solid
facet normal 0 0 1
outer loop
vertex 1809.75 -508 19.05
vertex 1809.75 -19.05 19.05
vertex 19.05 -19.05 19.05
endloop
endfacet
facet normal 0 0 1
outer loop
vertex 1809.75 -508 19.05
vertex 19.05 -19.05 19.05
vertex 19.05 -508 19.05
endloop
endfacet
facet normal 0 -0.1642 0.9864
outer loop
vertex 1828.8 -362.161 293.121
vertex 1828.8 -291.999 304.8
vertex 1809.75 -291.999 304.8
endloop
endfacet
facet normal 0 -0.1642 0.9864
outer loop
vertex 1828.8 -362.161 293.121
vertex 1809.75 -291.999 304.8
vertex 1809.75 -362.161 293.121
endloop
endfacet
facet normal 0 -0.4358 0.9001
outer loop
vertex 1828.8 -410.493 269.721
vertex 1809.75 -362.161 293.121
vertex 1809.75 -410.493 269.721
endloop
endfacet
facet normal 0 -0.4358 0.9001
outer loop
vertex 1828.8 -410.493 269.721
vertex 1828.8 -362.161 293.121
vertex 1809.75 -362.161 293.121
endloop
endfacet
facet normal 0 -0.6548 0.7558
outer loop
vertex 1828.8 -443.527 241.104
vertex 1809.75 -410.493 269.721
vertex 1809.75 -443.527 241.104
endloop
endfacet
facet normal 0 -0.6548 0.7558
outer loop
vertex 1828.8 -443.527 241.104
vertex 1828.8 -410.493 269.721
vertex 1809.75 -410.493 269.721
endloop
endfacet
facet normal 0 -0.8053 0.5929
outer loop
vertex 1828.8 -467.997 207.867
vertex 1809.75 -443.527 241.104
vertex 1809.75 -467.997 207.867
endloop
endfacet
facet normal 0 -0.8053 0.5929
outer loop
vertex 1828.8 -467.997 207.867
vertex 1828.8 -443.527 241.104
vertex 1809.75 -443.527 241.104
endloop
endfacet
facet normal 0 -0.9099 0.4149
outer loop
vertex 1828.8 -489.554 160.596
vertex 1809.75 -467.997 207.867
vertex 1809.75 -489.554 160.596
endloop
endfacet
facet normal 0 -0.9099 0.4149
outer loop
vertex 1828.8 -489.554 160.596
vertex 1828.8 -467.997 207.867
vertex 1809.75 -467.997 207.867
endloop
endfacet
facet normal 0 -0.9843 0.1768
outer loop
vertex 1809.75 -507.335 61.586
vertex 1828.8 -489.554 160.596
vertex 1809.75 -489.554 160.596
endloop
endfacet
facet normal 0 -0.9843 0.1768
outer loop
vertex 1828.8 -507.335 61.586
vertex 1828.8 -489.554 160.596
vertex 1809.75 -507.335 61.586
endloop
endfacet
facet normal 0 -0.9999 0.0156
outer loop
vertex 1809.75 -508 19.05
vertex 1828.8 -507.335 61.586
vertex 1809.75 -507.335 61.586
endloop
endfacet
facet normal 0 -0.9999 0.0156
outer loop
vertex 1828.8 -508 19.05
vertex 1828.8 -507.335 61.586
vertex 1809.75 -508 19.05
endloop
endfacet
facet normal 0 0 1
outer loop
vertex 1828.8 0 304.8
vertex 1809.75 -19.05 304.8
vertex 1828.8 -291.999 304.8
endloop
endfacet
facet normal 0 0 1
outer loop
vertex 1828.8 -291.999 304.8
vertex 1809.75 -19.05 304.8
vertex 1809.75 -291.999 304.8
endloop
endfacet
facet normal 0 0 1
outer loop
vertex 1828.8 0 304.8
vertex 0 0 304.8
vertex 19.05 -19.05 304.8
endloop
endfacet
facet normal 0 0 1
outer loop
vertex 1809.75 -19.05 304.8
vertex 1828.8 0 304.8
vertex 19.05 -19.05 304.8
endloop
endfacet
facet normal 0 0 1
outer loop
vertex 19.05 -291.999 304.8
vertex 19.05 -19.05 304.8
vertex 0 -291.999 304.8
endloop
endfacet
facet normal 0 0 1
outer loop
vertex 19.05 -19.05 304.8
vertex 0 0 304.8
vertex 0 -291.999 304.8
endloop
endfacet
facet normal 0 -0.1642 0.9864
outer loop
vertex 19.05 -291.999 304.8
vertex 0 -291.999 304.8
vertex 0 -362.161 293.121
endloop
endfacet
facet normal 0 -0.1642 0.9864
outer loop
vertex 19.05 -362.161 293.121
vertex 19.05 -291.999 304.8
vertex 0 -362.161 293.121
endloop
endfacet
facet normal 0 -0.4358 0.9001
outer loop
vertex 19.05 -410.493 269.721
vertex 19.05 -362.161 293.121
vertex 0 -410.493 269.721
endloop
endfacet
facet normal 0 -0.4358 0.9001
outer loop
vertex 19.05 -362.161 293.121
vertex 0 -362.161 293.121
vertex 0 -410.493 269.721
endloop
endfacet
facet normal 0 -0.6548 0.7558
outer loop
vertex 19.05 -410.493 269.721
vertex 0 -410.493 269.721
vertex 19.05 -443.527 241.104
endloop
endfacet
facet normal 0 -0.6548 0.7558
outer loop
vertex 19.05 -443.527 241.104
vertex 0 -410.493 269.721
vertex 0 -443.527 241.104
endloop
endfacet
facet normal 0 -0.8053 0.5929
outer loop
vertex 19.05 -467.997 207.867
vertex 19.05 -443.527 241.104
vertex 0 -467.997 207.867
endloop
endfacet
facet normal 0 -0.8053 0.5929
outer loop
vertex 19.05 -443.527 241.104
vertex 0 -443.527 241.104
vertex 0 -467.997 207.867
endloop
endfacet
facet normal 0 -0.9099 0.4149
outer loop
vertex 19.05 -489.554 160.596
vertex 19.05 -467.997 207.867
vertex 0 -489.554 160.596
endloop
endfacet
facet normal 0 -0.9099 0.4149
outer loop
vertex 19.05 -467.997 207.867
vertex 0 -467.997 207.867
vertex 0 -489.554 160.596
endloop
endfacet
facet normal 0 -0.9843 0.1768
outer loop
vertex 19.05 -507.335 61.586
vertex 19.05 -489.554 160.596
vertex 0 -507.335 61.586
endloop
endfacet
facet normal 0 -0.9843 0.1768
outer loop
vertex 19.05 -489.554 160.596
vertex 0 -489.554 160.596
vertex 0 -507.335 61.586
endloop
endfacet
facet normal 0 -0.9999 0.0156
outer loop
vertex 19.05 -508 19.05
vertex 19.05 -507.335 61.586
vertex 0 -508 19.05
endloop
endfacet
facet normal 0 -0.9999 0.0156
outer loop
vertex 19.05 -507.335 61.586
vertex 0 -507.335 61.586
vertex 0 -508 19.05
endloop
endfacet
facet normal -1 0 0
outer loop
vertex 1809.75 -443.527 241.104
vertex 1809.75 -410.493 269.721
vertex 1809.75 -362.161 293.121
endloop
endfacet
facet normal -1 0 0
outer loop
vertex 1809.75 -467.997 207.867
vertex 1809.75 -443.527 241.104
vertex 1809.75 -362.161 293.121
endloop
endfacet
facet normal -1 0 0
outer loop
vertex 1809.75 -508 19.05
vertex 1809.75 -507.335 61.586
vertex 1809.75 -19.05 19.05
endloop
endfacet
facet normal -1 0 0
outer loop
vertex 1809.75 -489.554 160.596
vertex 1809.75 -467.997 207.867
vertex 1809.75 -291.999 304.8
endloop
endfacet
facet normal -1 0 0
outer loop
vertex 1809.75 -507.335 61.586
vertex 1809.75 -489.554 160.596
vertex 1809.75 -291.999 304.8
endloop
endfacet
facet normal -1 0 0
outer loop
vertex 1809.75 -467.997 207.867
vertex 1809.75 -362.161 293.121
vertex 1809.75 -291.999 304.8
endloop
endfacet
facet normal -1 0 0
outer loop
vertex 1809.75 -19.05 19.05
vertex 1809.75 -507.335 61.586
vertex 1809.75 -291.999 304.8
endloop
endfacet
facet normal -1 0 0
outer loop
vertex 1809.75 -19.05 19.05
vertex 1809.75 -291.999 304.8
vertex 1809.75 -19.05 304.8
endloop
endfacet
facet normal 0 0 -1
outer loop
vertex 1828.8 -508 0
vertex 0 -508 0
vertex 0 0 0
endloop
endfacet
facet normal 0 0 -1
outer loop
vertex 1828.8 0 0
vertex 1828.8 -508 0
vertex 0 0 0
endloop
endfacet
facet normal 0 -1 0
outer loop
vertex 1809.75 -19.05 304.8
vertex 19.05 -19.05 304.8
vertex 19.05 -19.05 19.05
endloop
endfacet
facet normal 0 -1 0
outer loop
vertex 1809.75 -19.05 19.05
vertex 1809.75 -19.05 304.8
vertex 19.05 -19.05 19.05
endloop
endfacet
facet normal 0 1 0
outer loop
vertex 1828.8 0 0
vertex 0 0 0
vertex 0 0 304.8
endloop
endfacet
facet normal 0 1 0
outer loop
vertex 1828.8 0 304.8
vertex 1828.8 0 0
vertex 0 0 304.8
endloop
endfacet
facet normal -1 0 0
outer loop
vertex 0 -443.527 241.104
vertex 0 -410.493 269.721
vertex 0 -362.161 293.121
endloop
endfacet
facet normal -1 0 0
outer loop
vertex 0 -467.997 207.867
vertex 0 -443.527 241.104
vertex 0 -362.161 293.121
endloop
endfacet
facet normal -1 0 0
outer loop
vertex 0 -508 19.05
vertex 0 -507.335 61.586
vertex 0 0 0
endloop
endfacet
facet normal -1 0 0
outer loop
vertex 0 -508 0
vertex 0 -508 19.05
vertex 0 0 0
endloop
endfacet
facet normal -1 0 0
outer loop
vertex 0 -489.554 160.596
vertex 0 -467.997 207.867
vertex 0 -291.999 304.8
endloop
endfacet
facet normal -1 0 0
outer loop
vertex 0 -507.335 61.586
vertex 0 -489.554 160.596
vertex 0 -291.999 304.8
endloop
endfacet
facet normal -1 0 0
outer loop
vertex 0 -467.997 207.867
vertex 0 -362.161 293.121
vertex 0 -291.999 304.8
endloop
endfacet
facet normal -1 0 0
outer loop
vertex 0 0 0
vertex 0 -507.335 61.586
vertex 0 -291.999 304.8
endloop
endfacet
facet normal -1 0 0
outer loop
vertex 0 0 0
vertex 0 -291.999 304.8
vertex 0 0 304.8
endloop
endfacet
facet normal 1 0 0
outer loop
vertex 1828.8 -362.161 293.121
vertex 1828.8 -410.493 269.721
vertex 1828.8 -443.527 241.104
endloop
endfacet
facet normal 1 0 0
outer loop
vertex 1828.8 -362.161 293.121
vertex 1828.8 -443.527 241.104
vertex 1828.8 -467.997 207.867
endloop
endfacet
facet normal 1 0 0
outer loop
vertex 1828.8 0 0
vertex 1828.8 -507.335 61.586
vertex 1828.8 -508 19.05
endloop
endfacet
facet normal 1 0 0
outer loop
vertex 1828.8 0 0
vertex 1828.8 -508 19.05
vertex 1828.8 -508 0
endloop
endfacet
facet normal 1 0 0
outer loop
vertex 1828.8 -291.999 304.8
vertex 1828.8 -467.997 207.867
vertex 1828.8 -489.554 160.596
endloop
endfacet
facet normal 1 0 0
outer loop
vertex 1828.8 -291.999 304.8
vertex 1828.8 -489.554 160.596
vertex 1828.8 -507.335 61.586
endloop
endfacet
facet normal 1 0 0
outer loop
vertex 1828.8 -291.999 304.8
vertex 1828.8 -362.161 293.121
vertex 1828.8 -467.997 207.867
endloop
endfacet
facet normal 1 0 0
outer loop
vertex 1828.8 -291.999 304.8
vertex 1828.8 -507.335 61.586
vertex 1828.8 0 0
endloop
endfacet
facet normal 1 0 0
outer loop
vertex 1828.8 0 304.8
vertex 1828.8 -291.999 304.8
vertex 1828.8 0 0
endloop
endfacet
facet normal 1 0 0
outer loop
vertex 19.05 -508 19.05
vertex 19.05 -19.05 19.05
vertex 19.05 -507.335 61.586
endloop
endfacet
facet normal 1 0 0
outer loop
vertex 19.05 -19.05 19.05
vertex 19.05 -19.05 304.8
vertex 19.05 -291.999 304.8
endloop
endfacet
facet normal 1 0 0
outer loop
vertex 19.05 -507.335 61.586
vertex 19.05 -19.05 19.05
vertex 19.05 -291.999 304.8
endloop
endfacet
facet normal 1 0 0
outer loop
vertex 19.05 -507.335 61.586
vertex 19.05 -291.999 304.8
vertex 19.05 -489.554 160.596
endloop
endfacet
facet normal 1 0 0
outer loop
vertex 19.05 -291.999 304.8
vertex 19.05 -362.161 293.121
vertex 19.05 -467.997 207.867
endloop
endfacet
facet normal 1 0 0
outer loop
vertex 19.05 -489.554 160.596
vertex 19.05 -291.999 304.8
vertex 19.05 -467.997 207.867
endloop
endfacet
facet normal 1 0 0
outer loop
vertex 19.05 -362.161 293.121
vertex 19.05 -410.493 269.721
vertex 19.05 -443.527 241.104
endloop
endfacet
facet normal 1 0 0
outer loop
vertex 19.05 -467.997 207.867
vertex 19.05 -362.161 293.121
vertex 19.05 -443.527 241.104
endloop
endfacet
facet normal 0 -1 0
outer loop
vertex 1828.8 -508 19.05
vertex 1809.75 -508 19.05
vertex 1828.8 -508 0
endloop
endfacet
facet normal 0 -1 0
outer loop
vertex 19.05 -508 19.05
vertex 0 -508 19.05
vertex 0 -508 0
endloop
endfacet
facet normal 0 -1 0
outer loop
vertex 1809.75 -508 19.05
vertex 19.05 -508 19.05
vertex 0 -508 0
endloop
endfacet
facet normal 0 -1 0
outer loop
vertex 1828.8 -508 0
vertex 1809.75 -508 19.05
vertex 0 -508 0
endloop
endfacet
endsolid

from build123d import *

# Parameters (mm, degrees)
F1_DEPTH = 1828.8
F3_DEPTH = 19.05
F5_DEPTH = 19.05


# Not quite as in the source:
# - the dataset's text gives a spline's control points without its knots; the knots are read off the source's solid


with BuildPart() as f1:
    # F0 (on Right) → F1 (new body)
    with BuildSketch(Plane.YZ):
        Polygon((-508, 0), (0, 0), (0, 304.8), (-19.05, 304.8), (-19.05, 19.05), (-508, 19.05), align=None)
    extrude(amount=F1_DEPTH)

    # F2 (on face) → F3 (join)
    with BuildSketch(Plane.YZ.offset(1828.8)):
        with BuildLine():
            Line((-508, 19.05), (-508, 0))
            Line((-508, 0), (0, 0))
            Line((0, 0), (0, 304.8))
            Line((0, 304.8), (-19.05, 304.8))
            Line((-19.05, 304.8), (-291.9989773071, 304.8))
            add(Edge.make_bspline(
                [(-291.9989773071, 304.8), (-492.9765110924, 298.0255581824), (-509.9911244928, 37.8132619011), (-507.4893097422, 43.3757593081), (-508, 19.05)],
                knots=[0, 0, 0, 0, 0.7436196079, 1, 1, 1, 1], degree=3))
        make_face()
    extrude(amount=-F3_DEPTH)

    # F4 (on face) → F5 (join)
    with BuildSketch(Plane(origin=(0, 0, 0), x_dir=(0, -1, 0), z_dir=(-1, 0, 0))):
        with BuildLine():
            Line((19.05, 304.8), (0, 304.8))
            Line((0, 304.8), (0, 0))
            Line((0, 0), (508, 0))
            Line((508, 0), (508, 19.05))
            add(Edge.make_bspline(
                [(291.9989773071, 304.8), (492.9765110924, 298.0255581824), (509.9911244928, 37.8132619011), (507.4893097422, 43.3757593081), (508, 19.05)],
                knots=[0, 0, 0, 0, 0.7436196079, 1, 1, 1, 1], degree=3))
            Line((291.9989773071, 304.8), (19.05, 304.8))
        make_face()
    extrude(amount=-F5_DEPTH)


solid = f1.part
